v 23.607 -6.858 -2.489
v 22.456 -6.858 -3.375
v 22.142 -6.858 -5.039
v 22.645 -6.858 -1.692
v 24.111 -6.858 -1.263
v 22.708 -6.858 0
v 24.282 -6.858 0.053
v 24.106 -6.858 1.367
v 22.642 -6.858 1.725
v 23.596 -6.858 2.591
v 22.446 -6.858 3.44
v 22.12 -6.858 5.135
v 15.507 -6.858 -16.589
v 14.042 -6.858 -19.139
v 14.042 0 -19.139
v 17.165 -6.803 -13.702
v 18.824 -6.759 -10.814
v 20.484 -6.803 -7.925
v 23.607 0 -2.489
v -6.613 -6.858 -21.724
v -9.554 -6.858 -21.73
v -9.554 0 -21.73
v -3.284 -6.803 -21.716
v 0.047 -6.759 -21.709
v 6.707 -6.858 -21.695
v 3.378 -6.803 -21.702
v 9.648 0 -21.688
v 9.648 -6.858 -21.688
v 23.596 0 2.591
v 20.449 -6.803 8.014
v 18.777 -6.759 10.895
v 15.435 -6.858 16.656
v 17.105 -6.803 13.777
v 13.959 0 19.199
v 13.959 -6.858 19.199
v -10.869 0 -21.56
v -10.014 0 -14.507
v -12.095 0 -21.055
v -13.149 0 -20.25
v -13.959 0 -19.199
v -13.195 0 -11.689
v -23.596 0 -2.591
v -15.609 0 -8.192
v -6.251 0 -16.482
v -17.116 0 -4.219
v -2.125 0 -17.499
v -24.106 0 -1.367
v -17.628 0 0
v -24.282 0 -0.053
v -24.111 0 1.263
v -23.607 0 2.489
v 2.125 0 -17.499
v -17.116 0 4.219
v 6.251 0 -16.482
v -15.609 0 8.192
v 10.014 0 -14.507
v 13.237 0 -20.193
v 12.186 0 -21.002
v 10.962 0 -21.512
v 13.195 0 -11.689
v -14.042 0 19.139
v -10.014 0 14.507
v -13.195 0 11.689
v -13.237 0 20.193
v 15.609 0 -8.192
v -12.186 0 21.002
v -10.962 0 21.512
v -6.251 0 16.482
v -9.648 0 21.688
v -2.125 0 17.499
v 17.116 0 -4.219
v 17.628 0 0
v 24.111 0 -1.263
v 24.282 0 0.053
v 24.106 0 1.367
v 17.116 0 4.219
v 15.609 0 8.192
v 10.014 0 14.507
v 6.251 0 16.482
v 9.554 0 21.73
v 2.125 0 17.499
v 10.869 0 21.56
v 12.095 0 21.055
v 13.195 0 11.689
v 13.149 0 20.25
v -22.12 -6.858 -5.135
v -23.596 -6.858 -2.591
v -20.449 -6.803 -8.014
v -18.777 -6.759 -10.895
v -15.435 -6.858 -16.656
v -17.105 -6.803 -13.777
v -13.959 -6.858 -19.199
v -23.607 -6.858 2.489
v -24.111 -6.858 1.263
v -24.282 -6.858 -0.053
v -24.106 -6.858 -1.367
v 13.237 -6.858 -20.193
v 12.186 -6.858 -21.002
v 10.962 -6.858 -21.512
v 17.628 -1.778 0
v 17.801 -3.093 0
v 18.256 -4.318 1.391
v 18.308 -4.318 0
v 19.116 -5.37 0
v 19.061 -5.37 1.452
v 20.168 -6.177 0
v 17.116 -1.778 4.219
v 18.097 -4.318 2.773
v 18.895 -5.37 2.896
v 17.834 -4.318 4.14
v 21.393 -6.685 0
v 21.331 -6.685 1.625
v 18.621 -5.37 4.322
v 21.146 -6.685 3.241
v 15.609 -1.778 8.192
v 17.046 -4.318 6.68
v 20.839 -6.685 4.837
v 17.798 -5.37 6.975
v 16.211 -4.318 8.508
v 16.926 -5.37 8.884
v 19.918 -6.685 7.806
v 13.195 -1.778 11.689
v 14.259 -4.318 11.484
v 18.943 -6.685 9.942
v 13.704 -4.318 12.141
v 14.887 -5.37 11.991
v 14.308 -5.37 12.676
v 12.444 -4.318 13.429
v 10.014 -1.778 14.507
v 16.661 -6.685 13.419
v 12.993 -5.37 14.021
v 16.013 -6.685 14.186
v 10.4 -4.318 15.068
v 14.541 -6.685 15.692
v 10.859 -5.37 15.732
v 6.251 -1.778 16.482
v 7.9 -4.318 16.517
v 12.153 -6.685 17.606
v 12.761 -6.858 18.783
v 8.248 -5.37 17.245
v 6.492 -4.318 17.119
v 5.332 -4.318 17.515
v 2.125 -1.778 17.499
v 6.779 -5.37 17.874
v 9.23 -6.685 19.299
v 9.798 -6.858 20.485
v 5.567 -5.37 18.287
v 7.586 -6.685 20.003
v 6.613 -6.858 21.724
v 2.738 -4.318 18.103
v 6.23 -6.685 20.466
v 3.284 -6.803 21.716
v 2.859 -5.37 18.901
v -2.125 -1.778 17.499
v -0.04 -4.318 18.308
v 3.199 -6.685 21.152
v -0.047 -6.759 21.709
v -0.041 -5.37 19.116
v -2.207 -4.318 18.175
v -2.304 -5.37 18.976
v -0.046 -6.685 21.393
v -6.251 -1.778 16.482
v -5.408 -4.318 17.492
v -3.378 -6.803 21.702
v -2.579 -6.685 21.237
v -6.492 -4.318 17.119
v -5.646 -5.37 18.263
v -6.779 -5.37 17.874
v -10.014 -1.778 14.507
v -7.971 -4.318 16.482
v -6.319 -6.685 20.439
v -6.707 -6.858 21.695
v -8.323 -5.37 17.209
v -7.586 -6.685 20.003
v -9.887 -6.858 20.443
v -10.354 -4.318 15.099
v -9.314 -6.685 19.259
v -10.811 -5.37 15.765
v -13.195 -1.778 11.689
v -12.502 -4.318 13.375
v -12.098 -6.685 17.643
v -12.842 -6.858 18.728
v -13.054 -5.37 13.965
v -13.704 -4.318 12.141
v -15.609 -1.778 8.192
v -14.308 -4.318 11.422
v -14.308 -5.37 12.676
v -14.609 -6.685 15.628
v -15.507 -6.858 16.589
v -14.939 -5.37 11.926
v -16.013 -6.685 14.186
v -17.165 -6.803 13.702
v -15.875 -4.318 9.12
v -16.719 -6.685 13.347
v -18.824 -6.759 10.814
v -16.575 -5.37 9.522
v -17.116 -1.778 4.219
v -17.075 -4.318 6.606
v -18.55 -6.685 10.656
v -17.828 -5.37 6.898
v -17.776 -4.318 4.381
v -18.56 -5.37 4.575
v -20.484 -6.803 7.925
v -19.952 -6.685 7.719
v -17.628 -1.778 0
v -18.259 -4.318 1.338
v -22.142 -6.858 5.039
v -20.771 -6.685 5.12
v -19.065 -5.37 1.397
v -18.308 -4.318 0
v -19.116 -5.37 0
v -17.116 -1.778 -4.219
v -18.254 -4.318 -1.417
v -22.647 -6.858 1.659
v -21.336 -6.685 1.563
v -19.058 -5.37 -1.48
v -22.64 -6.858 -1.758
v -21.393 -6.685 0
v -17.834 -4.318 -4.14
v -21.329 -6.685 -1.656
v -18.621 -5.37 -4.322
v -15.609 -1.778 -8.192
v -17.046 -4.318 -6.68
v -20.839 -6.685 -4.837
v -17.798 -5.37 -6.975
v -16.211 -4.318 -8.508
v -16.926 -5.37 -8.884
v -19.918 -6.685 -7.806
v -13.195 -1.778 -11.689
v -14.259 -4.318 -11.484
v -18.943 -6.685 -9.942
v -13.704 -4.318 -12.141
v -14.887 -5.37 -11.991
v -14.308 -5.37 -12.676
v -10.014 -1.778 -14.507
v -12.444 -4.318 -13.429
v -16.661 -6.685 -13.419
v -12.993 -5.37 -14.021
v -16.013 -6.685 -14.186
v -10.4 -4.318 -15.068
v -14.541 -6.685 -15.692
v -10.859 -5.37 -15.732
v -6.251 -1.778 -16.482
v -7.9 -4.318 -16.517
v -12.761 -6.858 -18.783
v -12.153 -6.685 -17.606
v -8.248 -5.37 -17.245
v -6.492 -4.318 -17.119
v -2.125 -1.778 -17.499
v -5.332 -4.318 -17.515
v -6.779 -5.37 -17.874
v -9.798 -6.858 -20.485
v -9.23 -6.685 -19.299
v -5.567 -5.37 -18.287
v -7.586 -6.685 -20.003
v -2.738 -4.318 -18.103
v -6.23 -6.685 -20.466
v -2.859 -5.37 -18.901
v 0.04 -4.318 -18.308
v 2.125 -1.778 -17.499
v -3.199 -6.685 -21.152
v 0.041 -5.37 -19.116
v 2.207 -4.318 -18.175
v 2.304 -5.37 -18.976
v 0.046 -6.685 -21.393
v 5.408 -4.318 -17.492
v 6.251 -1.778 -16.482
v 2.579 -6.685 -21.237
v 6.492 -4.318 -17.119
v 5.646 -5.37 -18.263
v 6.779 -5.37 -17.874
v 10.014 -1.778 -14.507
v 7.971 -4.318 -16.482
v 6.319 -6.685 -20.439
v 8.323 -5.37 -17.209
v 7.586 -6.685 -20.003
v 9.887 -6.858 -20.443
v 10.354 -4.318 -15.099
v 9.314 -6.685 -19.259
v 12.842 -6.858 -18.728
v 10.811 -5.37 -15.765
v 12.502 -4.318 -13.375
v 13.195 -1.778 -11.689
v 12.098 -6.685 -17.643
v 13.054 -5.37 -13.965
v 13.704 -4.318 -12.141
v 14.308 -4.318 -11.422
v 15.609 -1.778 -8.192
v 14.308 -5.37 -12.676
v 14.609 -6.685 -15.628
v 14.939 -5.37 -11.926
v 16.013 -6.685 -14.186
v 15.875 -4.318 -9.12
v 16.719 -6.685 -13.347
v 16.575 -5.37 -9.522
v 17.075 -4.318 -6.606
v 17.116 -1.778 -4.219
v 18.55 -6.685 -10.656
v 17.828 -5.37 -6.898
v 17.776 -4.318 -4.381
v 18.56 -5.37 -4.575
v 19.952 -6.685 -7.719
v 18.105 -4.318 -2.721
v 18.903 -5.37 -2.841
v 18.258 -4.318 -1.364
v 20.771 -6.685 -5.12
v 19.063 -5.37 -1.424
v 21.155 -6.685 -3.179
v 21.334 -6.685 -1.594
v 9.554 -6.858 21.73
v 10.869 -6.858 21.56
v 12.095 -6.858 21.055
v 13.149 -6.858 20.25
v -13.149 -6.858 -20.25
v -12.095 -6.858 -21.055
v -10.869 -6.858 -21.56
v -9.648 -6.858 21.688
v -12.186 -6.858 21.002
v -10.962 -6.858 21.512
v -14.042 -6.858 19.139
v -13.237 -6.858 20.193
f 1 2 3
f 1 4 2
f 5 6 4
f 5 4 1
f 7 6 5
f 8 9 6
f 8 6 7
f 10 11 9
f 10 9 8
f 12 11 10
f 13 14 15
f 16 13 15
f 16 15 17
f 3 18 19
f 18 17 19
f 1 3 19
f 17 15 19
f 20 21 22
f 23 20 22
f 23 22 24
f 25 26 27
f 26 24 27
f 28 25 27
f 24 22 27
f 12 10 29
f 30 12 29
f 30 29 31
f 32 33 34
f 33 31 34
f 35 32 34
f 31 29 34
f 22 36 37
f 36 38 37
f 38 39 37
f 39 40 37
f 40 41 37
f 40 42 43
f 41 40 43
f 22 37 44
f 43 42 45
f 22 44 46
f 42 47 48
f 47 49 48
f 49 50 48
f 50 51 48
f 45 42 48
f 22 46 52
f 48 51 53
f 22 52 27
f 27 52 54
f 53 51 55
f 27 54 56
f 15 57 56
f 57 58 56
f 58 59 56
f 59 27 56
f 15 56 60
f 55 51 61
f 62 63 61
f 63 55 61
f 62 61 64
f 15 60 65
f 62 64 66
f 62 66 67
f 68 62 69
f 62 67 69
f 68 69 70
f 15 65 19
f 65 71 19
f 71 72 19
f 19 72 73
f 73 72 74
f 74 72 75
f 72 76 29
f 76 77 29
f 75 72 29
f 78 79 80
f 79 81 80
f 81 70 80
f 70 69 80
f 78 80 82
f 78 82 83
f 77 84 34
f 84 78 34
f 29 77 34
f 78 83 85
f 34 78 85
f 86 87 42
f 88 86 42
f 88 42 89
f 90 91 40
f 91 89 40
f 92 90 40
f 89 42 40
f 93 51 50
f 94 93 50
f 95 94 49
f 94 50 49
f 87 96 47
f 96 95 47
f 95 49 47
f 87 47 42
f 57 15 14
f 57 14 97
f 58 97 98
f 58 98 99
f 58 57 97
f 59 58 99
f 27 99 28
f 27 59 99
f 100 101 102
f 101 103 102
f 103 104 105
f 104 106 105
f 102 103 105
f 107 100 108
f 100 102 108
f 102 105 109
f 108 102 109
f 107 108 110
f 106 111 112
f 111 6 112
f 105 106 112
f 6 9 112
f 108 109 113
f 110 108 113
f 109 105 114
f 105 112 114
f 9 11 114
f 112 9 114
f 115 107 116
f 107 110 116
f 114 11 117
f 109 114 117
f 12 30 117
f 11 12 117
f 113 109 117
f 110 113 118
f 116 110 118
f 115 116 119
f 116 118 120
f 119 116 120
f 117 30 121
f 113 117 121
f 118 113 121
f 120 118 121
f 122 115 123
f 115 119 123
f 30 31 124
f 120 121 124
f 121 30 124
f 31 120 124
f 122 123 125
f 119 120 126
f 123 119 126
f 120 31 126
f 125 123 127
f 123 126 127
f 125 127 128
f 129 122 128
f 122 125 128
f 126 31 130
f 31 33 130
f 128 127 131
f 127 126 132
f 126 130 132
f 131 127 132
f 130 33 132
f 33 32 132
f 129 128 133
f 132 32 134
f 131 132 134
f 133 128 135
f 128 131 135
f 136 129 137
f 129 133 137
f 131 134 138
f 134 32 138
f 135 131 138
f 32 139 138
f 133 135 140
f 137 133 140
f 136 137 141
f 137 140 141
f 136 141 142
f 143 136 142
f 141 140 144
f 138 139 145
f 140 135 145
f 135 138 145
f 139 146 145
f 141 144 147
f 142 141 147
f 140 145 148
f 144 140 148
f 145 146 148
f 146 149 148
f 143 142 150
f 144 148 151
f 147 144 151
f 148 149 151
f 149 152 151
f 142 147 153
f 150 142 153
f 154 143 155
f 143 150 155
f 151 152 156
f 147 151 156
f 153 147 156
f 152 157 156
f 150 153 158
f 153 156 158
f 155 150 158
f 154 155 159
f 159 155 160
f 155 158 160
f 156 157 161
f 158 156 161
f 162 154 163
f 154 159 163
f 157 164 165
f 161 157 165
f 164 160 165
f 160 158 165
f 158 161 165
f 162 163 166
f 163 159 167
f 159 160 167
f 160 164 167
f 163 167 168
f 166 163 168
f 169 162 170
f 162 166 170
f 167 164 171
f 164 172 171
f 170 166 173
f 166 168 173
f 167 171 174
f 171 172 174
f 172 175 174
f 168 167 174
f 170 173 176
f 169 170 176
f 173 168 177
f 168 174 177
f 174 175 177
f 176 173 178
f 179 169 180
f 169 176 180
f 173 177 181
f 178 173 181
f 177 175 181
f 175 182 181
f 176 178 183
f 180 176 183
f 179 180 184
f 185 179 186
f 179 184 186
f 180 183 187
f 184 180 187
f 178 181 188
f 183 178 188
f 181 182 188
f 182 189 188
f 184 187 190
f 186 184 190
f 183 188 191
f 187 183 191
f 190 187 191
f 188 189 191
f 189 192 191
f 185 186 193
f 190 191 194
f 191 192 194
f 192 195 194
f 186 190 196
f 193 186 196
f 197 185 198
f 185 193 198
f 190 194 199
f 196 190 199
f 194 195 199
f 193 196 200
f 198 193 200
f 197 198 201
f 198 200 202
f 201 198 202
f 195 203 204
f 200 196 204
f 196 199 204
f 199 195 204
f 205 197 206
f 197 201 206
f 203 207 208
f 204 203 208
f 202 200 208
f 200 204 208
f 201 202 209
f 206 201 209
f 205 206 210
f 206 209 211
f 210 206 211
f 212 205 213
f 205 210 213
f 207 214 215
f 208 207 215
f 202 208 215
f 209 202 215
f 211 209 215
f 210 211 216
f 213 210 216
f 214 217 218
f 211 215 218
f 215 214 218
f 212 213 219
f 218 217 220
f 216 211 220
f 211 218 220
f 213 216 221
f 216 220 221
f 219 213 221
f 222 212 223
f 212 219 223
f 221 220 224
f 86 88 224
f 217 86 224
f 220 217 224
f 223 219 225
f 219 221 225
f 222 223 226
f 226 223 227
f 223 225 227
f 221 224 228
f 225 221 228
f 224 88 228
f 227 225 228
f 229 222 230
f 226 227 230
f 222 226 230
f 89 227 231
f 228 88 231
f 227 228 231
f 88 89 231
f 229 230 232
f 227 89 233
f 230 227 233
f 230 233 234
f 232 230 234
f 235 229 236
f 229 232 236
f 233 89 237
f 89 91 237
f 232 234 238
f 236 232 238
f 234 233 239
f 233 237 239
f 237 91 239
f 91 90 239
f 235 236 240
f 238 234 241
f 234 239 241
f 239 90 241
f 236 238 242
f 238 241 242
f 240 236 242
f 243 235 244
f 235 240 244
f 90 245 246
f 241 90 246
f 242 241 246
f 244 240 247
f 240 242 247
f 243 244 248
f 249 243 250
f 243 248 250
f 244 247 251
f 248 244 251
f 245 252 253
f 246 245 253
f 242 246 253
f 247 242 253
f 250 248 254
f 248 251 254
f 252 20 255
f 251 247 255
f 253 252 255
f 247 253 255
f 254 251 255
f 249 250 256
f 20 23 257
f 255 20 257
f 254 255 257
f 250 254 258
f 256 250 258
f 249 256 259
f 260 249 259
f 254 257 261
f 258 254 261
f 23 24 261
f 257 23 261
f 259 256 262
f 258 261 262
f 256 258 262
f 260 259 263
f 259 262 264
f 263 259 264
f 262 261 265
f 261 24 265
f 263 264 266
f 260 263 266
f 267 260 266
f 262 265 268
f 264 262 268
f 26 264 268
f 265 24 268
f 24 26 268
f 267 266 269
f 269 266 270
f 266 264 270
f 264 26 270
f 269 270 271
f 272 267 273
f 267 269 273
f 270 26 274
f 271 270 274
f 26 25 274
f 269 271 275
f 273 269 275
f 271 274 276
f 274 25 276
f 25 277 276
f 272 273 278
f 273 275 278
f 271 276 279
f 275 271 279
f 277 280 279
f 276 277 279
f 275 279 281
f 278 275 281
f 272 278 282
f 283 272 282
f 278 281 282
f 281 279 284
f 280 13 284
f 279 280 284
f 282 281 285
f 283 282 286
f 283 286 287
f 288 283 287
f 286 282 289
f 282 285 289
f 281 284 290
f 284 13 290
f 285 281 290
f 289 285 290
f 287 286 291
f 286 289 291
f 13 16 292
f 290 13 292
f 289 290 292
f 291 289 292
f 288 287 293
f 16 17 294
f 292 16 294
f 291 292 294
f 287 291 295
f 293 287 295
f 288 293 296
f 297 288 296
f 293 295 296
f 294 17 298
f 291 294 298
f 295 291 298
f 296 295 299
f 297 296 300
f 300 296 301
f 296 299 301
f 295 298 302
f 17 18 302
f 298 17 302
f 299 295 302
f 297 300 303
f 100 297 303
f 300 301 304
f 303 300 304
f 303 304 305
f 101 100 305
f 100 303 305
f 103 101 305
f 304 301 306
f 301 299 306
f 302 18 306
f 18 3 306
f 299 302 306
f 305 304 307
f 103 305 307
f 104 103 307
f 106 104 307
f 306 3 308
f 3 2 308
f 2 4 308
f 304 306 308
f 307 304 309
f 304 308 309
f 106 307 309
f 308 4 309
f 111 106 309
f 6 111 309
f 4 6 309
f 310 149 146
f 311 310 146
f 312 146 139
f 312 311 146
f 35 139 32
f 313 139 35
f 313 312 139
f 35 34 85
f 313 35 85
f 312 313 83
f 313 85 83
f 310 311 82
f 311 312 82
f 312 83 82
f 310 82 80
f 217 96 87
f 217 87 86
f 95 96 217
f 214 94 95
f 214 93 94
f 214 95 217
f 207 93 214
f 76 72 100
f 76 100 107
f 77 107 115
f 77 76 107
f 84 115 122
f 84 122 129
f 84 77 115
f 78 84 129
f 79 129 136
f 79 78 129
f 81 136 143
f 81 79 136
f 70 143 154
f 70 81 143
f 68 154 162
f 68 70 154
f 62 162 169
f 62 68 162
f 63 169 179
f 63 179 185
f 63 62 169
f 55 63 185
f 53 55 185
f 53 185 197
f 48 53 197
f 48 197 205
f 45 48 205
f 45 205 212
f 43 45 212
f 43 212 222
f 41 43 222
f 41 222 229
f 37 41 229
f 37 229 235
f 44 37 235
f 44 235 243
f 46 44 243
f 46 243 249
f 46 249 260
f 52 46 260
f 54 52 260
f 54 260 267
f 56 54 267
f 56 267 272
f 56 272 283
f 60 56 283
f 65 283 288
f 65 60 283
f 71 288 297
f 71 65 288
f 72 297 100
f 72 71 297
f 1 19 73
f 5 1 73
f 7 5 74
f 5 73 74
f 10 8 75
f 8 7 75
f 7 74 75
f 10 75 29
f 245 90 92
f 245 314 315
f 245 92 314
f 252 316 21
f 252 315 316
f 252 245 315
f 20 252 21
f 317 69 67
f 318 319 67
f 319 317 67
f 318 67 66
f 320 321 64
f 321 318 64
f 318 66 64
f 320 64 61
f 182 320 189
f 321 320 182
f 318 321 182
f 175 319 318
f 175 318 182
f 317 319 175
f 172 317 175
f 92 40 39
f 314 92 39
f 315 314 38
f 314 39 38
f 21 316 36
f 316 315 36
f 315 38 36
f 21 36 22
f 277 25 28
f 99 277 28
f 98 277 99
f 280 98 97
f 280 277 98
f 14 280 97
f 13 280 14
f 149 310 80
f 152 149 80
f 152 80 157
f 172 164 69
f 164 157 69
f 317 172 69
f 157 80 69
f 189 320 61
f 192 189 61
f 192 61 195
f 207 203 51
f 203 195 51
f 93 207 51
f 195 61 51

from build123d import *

# Parameters (mm, degrees)
F0_R        = 17.6278331086
F1_DEPTH    = 6.858
F2_T1_DEPTH = 21.5226968374


# Not quite as in the source:
# - a fillet or chamfer that OpenCascade refuses, or shapes differently, is made with other operations: its cross-section is extruded or revolved along the edge and cut away or added


with BuildPart() as f1:
    # F0 (on Front) → F1 (new body)
    with BuildSketch(Plane.XZ):
        Polygon((25.0675420445, 0.0543576147), (12.486695947, 21.7363070283), (-12.5808460975, 21.6819494136), (-25.0675420445, -0.0543576147), (-12.486695947, -21.7363070283), (12.5808460975, -21.6819494136), align=None)
        Circle(F0_R, mode=Mode.SUBTRACT)
    extrude(amount=F1_DEPTH)

    # F2: fillet of radius 5.08 on 7 edges, made by hand

    # F2_s2 → F2_t1 (cut)
    with BuildSketch(Plane.XZ.offset(-7.3323484187)):
        with BuildLine():
            ThreePointArc((-23.6065836488, 2.4888163666), (-24.2816651572, -0.052653483), (-23.5955679683, -2.5911716899))
            Line((-23.5955679683, -2.5911716899), (-25.0675420445, -0.0543576147))
            Line((-25.0675420445, -0.0543576147), (-23.6065836488, 2.4888163666))
        make_face()
        with BuildLine():
            ThreePointArc((-13.9586700232, -19.1994929531), (-12.0952333247, -21.0548656138), (-9.5537634751, -21.7299471223))
            Line((-9.5537634751, -21.7299471223), (-12.486695947, -21.7363070283))
            Line((-12.486695947, -21.7363070283), (-13.9586700232, -19.1994929531))
        make_face()
        with BuildLine():
            ThreePointArc((14.0418044932, -19.1387754323), (12.1864318325, -21.0022121308), (9.6479136256, -21.6883093197))
            Line((9.6479136256, -21.6883093197), (12.5808460975, -21.6819494136))
            Line((12.5808460975, -21.6819494136), (14.0418044932, -19.1387754323))
        make_face()
        with BuildLine():
            ThreePointArc((23.6065836488, -2.4888163666), (24.2816651572, 0.052653483), (23.5955679683, 2.5911716899))
            Line((23.5955679683, 2.5911716899), (25.0675420445, 0.0543576147))
            Line((25.0675420445, 0.0543576147), (23.6065836488, -2.4888163666))
        make_face()
        with BuildLine():
            ThreePointArc((13.9586700232, 19.1994929531), (12.0952333247, 21.0548656138), (9.5537634751, 21.7299471223))
            Line((9.5537634751, 21.7299471223), (12.486695947, 21.7363070283))
            Line((12.486695947, 21.7363070283), (13.9586700232, 19.1994929531))
        make_face()
        with BuildLine():
            ThreePointArc((-9.6479136256, 21.6883093197), (-12.1864318325, 21.0022121308), (-14.0418044932, 19.1387754323))
            Line((-14.0418044932, 19.1387754323), (-12.5808460975, 21.6819494136))
            Line((-12.5808460975, 21.6819494136), (-9.6479136256, 21.6883093197))
        make_face()
    extrude(amount=F2_T1_DEPTH, mode=Mode.SUBTRACT)

    # F2_s3 → F2_t4 (revolve, cut)
    with BuildSketch(Plane.XY):
        with BuildLine():
            ThreePointArc((17.6278331086, -1.778), (19.1157306602, -5.3701024484), (22.7078331086, -6.858))
            Line((22.7078331086, -6.858), (17.6278331086, -6.858))
            Line((17.6278331086, -6.858), (17.6278331086, -1.778))
        make_face()
    revolve(axis=Axis((0, -6.858, 0), (0, -1, 0)), mode=Mode.SUBTRACT)


solid = f1.part
